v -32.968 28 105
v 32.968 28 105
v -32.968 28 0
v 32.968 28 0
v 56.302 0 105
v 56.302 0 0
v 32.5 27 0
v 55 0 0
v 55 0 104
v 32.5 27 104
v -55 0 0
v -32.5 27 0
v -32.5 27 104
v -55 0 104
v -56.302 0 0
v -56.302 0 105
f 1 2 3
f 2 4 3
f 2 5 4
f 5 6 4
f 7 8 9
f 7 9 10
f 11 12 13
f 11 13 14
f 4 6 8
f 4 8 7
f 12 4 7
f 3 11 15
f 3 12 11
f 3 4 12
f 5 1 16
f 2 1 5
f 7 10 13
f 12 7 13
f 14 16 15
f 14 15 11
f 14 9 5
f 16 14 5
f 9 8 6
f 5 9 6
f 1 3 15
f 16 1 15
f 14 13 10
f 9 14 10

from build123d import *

# Parameters (mm, degrees)
SALIENTE_EXTRUIR1_DEPTH = 104
SALIENTE_EXTRUIR2_DEPTH = 1


with BuildPart() as part:
    # Croquis1 → Saliente-Extruir1 (new body)
    with BuildSketch(Plane.XY):
        Polygon((-55, 0), (-56.301708279, 0), (-32.968374946, 28), (32.968374946, 28), (56.301708279, 0), (55, 0), (32.5, 27), (-32.5, 27), align=None)
    extrude(amount=SALIENTE_EXTRUIR1_DEPTH)

    # Croquis4 → Saliente-Extruir2 (add)
    with BuildSketch(Plane.XY.offset(104)):
        Polygon((-56.301708279, 0), (56.301708279, 0), (32.968374946, 28), (-32.968374946, 28), align=None)
    extrude(amount=SALIENTE_EXTRUIR2_DEPTH)


solid = part.part
